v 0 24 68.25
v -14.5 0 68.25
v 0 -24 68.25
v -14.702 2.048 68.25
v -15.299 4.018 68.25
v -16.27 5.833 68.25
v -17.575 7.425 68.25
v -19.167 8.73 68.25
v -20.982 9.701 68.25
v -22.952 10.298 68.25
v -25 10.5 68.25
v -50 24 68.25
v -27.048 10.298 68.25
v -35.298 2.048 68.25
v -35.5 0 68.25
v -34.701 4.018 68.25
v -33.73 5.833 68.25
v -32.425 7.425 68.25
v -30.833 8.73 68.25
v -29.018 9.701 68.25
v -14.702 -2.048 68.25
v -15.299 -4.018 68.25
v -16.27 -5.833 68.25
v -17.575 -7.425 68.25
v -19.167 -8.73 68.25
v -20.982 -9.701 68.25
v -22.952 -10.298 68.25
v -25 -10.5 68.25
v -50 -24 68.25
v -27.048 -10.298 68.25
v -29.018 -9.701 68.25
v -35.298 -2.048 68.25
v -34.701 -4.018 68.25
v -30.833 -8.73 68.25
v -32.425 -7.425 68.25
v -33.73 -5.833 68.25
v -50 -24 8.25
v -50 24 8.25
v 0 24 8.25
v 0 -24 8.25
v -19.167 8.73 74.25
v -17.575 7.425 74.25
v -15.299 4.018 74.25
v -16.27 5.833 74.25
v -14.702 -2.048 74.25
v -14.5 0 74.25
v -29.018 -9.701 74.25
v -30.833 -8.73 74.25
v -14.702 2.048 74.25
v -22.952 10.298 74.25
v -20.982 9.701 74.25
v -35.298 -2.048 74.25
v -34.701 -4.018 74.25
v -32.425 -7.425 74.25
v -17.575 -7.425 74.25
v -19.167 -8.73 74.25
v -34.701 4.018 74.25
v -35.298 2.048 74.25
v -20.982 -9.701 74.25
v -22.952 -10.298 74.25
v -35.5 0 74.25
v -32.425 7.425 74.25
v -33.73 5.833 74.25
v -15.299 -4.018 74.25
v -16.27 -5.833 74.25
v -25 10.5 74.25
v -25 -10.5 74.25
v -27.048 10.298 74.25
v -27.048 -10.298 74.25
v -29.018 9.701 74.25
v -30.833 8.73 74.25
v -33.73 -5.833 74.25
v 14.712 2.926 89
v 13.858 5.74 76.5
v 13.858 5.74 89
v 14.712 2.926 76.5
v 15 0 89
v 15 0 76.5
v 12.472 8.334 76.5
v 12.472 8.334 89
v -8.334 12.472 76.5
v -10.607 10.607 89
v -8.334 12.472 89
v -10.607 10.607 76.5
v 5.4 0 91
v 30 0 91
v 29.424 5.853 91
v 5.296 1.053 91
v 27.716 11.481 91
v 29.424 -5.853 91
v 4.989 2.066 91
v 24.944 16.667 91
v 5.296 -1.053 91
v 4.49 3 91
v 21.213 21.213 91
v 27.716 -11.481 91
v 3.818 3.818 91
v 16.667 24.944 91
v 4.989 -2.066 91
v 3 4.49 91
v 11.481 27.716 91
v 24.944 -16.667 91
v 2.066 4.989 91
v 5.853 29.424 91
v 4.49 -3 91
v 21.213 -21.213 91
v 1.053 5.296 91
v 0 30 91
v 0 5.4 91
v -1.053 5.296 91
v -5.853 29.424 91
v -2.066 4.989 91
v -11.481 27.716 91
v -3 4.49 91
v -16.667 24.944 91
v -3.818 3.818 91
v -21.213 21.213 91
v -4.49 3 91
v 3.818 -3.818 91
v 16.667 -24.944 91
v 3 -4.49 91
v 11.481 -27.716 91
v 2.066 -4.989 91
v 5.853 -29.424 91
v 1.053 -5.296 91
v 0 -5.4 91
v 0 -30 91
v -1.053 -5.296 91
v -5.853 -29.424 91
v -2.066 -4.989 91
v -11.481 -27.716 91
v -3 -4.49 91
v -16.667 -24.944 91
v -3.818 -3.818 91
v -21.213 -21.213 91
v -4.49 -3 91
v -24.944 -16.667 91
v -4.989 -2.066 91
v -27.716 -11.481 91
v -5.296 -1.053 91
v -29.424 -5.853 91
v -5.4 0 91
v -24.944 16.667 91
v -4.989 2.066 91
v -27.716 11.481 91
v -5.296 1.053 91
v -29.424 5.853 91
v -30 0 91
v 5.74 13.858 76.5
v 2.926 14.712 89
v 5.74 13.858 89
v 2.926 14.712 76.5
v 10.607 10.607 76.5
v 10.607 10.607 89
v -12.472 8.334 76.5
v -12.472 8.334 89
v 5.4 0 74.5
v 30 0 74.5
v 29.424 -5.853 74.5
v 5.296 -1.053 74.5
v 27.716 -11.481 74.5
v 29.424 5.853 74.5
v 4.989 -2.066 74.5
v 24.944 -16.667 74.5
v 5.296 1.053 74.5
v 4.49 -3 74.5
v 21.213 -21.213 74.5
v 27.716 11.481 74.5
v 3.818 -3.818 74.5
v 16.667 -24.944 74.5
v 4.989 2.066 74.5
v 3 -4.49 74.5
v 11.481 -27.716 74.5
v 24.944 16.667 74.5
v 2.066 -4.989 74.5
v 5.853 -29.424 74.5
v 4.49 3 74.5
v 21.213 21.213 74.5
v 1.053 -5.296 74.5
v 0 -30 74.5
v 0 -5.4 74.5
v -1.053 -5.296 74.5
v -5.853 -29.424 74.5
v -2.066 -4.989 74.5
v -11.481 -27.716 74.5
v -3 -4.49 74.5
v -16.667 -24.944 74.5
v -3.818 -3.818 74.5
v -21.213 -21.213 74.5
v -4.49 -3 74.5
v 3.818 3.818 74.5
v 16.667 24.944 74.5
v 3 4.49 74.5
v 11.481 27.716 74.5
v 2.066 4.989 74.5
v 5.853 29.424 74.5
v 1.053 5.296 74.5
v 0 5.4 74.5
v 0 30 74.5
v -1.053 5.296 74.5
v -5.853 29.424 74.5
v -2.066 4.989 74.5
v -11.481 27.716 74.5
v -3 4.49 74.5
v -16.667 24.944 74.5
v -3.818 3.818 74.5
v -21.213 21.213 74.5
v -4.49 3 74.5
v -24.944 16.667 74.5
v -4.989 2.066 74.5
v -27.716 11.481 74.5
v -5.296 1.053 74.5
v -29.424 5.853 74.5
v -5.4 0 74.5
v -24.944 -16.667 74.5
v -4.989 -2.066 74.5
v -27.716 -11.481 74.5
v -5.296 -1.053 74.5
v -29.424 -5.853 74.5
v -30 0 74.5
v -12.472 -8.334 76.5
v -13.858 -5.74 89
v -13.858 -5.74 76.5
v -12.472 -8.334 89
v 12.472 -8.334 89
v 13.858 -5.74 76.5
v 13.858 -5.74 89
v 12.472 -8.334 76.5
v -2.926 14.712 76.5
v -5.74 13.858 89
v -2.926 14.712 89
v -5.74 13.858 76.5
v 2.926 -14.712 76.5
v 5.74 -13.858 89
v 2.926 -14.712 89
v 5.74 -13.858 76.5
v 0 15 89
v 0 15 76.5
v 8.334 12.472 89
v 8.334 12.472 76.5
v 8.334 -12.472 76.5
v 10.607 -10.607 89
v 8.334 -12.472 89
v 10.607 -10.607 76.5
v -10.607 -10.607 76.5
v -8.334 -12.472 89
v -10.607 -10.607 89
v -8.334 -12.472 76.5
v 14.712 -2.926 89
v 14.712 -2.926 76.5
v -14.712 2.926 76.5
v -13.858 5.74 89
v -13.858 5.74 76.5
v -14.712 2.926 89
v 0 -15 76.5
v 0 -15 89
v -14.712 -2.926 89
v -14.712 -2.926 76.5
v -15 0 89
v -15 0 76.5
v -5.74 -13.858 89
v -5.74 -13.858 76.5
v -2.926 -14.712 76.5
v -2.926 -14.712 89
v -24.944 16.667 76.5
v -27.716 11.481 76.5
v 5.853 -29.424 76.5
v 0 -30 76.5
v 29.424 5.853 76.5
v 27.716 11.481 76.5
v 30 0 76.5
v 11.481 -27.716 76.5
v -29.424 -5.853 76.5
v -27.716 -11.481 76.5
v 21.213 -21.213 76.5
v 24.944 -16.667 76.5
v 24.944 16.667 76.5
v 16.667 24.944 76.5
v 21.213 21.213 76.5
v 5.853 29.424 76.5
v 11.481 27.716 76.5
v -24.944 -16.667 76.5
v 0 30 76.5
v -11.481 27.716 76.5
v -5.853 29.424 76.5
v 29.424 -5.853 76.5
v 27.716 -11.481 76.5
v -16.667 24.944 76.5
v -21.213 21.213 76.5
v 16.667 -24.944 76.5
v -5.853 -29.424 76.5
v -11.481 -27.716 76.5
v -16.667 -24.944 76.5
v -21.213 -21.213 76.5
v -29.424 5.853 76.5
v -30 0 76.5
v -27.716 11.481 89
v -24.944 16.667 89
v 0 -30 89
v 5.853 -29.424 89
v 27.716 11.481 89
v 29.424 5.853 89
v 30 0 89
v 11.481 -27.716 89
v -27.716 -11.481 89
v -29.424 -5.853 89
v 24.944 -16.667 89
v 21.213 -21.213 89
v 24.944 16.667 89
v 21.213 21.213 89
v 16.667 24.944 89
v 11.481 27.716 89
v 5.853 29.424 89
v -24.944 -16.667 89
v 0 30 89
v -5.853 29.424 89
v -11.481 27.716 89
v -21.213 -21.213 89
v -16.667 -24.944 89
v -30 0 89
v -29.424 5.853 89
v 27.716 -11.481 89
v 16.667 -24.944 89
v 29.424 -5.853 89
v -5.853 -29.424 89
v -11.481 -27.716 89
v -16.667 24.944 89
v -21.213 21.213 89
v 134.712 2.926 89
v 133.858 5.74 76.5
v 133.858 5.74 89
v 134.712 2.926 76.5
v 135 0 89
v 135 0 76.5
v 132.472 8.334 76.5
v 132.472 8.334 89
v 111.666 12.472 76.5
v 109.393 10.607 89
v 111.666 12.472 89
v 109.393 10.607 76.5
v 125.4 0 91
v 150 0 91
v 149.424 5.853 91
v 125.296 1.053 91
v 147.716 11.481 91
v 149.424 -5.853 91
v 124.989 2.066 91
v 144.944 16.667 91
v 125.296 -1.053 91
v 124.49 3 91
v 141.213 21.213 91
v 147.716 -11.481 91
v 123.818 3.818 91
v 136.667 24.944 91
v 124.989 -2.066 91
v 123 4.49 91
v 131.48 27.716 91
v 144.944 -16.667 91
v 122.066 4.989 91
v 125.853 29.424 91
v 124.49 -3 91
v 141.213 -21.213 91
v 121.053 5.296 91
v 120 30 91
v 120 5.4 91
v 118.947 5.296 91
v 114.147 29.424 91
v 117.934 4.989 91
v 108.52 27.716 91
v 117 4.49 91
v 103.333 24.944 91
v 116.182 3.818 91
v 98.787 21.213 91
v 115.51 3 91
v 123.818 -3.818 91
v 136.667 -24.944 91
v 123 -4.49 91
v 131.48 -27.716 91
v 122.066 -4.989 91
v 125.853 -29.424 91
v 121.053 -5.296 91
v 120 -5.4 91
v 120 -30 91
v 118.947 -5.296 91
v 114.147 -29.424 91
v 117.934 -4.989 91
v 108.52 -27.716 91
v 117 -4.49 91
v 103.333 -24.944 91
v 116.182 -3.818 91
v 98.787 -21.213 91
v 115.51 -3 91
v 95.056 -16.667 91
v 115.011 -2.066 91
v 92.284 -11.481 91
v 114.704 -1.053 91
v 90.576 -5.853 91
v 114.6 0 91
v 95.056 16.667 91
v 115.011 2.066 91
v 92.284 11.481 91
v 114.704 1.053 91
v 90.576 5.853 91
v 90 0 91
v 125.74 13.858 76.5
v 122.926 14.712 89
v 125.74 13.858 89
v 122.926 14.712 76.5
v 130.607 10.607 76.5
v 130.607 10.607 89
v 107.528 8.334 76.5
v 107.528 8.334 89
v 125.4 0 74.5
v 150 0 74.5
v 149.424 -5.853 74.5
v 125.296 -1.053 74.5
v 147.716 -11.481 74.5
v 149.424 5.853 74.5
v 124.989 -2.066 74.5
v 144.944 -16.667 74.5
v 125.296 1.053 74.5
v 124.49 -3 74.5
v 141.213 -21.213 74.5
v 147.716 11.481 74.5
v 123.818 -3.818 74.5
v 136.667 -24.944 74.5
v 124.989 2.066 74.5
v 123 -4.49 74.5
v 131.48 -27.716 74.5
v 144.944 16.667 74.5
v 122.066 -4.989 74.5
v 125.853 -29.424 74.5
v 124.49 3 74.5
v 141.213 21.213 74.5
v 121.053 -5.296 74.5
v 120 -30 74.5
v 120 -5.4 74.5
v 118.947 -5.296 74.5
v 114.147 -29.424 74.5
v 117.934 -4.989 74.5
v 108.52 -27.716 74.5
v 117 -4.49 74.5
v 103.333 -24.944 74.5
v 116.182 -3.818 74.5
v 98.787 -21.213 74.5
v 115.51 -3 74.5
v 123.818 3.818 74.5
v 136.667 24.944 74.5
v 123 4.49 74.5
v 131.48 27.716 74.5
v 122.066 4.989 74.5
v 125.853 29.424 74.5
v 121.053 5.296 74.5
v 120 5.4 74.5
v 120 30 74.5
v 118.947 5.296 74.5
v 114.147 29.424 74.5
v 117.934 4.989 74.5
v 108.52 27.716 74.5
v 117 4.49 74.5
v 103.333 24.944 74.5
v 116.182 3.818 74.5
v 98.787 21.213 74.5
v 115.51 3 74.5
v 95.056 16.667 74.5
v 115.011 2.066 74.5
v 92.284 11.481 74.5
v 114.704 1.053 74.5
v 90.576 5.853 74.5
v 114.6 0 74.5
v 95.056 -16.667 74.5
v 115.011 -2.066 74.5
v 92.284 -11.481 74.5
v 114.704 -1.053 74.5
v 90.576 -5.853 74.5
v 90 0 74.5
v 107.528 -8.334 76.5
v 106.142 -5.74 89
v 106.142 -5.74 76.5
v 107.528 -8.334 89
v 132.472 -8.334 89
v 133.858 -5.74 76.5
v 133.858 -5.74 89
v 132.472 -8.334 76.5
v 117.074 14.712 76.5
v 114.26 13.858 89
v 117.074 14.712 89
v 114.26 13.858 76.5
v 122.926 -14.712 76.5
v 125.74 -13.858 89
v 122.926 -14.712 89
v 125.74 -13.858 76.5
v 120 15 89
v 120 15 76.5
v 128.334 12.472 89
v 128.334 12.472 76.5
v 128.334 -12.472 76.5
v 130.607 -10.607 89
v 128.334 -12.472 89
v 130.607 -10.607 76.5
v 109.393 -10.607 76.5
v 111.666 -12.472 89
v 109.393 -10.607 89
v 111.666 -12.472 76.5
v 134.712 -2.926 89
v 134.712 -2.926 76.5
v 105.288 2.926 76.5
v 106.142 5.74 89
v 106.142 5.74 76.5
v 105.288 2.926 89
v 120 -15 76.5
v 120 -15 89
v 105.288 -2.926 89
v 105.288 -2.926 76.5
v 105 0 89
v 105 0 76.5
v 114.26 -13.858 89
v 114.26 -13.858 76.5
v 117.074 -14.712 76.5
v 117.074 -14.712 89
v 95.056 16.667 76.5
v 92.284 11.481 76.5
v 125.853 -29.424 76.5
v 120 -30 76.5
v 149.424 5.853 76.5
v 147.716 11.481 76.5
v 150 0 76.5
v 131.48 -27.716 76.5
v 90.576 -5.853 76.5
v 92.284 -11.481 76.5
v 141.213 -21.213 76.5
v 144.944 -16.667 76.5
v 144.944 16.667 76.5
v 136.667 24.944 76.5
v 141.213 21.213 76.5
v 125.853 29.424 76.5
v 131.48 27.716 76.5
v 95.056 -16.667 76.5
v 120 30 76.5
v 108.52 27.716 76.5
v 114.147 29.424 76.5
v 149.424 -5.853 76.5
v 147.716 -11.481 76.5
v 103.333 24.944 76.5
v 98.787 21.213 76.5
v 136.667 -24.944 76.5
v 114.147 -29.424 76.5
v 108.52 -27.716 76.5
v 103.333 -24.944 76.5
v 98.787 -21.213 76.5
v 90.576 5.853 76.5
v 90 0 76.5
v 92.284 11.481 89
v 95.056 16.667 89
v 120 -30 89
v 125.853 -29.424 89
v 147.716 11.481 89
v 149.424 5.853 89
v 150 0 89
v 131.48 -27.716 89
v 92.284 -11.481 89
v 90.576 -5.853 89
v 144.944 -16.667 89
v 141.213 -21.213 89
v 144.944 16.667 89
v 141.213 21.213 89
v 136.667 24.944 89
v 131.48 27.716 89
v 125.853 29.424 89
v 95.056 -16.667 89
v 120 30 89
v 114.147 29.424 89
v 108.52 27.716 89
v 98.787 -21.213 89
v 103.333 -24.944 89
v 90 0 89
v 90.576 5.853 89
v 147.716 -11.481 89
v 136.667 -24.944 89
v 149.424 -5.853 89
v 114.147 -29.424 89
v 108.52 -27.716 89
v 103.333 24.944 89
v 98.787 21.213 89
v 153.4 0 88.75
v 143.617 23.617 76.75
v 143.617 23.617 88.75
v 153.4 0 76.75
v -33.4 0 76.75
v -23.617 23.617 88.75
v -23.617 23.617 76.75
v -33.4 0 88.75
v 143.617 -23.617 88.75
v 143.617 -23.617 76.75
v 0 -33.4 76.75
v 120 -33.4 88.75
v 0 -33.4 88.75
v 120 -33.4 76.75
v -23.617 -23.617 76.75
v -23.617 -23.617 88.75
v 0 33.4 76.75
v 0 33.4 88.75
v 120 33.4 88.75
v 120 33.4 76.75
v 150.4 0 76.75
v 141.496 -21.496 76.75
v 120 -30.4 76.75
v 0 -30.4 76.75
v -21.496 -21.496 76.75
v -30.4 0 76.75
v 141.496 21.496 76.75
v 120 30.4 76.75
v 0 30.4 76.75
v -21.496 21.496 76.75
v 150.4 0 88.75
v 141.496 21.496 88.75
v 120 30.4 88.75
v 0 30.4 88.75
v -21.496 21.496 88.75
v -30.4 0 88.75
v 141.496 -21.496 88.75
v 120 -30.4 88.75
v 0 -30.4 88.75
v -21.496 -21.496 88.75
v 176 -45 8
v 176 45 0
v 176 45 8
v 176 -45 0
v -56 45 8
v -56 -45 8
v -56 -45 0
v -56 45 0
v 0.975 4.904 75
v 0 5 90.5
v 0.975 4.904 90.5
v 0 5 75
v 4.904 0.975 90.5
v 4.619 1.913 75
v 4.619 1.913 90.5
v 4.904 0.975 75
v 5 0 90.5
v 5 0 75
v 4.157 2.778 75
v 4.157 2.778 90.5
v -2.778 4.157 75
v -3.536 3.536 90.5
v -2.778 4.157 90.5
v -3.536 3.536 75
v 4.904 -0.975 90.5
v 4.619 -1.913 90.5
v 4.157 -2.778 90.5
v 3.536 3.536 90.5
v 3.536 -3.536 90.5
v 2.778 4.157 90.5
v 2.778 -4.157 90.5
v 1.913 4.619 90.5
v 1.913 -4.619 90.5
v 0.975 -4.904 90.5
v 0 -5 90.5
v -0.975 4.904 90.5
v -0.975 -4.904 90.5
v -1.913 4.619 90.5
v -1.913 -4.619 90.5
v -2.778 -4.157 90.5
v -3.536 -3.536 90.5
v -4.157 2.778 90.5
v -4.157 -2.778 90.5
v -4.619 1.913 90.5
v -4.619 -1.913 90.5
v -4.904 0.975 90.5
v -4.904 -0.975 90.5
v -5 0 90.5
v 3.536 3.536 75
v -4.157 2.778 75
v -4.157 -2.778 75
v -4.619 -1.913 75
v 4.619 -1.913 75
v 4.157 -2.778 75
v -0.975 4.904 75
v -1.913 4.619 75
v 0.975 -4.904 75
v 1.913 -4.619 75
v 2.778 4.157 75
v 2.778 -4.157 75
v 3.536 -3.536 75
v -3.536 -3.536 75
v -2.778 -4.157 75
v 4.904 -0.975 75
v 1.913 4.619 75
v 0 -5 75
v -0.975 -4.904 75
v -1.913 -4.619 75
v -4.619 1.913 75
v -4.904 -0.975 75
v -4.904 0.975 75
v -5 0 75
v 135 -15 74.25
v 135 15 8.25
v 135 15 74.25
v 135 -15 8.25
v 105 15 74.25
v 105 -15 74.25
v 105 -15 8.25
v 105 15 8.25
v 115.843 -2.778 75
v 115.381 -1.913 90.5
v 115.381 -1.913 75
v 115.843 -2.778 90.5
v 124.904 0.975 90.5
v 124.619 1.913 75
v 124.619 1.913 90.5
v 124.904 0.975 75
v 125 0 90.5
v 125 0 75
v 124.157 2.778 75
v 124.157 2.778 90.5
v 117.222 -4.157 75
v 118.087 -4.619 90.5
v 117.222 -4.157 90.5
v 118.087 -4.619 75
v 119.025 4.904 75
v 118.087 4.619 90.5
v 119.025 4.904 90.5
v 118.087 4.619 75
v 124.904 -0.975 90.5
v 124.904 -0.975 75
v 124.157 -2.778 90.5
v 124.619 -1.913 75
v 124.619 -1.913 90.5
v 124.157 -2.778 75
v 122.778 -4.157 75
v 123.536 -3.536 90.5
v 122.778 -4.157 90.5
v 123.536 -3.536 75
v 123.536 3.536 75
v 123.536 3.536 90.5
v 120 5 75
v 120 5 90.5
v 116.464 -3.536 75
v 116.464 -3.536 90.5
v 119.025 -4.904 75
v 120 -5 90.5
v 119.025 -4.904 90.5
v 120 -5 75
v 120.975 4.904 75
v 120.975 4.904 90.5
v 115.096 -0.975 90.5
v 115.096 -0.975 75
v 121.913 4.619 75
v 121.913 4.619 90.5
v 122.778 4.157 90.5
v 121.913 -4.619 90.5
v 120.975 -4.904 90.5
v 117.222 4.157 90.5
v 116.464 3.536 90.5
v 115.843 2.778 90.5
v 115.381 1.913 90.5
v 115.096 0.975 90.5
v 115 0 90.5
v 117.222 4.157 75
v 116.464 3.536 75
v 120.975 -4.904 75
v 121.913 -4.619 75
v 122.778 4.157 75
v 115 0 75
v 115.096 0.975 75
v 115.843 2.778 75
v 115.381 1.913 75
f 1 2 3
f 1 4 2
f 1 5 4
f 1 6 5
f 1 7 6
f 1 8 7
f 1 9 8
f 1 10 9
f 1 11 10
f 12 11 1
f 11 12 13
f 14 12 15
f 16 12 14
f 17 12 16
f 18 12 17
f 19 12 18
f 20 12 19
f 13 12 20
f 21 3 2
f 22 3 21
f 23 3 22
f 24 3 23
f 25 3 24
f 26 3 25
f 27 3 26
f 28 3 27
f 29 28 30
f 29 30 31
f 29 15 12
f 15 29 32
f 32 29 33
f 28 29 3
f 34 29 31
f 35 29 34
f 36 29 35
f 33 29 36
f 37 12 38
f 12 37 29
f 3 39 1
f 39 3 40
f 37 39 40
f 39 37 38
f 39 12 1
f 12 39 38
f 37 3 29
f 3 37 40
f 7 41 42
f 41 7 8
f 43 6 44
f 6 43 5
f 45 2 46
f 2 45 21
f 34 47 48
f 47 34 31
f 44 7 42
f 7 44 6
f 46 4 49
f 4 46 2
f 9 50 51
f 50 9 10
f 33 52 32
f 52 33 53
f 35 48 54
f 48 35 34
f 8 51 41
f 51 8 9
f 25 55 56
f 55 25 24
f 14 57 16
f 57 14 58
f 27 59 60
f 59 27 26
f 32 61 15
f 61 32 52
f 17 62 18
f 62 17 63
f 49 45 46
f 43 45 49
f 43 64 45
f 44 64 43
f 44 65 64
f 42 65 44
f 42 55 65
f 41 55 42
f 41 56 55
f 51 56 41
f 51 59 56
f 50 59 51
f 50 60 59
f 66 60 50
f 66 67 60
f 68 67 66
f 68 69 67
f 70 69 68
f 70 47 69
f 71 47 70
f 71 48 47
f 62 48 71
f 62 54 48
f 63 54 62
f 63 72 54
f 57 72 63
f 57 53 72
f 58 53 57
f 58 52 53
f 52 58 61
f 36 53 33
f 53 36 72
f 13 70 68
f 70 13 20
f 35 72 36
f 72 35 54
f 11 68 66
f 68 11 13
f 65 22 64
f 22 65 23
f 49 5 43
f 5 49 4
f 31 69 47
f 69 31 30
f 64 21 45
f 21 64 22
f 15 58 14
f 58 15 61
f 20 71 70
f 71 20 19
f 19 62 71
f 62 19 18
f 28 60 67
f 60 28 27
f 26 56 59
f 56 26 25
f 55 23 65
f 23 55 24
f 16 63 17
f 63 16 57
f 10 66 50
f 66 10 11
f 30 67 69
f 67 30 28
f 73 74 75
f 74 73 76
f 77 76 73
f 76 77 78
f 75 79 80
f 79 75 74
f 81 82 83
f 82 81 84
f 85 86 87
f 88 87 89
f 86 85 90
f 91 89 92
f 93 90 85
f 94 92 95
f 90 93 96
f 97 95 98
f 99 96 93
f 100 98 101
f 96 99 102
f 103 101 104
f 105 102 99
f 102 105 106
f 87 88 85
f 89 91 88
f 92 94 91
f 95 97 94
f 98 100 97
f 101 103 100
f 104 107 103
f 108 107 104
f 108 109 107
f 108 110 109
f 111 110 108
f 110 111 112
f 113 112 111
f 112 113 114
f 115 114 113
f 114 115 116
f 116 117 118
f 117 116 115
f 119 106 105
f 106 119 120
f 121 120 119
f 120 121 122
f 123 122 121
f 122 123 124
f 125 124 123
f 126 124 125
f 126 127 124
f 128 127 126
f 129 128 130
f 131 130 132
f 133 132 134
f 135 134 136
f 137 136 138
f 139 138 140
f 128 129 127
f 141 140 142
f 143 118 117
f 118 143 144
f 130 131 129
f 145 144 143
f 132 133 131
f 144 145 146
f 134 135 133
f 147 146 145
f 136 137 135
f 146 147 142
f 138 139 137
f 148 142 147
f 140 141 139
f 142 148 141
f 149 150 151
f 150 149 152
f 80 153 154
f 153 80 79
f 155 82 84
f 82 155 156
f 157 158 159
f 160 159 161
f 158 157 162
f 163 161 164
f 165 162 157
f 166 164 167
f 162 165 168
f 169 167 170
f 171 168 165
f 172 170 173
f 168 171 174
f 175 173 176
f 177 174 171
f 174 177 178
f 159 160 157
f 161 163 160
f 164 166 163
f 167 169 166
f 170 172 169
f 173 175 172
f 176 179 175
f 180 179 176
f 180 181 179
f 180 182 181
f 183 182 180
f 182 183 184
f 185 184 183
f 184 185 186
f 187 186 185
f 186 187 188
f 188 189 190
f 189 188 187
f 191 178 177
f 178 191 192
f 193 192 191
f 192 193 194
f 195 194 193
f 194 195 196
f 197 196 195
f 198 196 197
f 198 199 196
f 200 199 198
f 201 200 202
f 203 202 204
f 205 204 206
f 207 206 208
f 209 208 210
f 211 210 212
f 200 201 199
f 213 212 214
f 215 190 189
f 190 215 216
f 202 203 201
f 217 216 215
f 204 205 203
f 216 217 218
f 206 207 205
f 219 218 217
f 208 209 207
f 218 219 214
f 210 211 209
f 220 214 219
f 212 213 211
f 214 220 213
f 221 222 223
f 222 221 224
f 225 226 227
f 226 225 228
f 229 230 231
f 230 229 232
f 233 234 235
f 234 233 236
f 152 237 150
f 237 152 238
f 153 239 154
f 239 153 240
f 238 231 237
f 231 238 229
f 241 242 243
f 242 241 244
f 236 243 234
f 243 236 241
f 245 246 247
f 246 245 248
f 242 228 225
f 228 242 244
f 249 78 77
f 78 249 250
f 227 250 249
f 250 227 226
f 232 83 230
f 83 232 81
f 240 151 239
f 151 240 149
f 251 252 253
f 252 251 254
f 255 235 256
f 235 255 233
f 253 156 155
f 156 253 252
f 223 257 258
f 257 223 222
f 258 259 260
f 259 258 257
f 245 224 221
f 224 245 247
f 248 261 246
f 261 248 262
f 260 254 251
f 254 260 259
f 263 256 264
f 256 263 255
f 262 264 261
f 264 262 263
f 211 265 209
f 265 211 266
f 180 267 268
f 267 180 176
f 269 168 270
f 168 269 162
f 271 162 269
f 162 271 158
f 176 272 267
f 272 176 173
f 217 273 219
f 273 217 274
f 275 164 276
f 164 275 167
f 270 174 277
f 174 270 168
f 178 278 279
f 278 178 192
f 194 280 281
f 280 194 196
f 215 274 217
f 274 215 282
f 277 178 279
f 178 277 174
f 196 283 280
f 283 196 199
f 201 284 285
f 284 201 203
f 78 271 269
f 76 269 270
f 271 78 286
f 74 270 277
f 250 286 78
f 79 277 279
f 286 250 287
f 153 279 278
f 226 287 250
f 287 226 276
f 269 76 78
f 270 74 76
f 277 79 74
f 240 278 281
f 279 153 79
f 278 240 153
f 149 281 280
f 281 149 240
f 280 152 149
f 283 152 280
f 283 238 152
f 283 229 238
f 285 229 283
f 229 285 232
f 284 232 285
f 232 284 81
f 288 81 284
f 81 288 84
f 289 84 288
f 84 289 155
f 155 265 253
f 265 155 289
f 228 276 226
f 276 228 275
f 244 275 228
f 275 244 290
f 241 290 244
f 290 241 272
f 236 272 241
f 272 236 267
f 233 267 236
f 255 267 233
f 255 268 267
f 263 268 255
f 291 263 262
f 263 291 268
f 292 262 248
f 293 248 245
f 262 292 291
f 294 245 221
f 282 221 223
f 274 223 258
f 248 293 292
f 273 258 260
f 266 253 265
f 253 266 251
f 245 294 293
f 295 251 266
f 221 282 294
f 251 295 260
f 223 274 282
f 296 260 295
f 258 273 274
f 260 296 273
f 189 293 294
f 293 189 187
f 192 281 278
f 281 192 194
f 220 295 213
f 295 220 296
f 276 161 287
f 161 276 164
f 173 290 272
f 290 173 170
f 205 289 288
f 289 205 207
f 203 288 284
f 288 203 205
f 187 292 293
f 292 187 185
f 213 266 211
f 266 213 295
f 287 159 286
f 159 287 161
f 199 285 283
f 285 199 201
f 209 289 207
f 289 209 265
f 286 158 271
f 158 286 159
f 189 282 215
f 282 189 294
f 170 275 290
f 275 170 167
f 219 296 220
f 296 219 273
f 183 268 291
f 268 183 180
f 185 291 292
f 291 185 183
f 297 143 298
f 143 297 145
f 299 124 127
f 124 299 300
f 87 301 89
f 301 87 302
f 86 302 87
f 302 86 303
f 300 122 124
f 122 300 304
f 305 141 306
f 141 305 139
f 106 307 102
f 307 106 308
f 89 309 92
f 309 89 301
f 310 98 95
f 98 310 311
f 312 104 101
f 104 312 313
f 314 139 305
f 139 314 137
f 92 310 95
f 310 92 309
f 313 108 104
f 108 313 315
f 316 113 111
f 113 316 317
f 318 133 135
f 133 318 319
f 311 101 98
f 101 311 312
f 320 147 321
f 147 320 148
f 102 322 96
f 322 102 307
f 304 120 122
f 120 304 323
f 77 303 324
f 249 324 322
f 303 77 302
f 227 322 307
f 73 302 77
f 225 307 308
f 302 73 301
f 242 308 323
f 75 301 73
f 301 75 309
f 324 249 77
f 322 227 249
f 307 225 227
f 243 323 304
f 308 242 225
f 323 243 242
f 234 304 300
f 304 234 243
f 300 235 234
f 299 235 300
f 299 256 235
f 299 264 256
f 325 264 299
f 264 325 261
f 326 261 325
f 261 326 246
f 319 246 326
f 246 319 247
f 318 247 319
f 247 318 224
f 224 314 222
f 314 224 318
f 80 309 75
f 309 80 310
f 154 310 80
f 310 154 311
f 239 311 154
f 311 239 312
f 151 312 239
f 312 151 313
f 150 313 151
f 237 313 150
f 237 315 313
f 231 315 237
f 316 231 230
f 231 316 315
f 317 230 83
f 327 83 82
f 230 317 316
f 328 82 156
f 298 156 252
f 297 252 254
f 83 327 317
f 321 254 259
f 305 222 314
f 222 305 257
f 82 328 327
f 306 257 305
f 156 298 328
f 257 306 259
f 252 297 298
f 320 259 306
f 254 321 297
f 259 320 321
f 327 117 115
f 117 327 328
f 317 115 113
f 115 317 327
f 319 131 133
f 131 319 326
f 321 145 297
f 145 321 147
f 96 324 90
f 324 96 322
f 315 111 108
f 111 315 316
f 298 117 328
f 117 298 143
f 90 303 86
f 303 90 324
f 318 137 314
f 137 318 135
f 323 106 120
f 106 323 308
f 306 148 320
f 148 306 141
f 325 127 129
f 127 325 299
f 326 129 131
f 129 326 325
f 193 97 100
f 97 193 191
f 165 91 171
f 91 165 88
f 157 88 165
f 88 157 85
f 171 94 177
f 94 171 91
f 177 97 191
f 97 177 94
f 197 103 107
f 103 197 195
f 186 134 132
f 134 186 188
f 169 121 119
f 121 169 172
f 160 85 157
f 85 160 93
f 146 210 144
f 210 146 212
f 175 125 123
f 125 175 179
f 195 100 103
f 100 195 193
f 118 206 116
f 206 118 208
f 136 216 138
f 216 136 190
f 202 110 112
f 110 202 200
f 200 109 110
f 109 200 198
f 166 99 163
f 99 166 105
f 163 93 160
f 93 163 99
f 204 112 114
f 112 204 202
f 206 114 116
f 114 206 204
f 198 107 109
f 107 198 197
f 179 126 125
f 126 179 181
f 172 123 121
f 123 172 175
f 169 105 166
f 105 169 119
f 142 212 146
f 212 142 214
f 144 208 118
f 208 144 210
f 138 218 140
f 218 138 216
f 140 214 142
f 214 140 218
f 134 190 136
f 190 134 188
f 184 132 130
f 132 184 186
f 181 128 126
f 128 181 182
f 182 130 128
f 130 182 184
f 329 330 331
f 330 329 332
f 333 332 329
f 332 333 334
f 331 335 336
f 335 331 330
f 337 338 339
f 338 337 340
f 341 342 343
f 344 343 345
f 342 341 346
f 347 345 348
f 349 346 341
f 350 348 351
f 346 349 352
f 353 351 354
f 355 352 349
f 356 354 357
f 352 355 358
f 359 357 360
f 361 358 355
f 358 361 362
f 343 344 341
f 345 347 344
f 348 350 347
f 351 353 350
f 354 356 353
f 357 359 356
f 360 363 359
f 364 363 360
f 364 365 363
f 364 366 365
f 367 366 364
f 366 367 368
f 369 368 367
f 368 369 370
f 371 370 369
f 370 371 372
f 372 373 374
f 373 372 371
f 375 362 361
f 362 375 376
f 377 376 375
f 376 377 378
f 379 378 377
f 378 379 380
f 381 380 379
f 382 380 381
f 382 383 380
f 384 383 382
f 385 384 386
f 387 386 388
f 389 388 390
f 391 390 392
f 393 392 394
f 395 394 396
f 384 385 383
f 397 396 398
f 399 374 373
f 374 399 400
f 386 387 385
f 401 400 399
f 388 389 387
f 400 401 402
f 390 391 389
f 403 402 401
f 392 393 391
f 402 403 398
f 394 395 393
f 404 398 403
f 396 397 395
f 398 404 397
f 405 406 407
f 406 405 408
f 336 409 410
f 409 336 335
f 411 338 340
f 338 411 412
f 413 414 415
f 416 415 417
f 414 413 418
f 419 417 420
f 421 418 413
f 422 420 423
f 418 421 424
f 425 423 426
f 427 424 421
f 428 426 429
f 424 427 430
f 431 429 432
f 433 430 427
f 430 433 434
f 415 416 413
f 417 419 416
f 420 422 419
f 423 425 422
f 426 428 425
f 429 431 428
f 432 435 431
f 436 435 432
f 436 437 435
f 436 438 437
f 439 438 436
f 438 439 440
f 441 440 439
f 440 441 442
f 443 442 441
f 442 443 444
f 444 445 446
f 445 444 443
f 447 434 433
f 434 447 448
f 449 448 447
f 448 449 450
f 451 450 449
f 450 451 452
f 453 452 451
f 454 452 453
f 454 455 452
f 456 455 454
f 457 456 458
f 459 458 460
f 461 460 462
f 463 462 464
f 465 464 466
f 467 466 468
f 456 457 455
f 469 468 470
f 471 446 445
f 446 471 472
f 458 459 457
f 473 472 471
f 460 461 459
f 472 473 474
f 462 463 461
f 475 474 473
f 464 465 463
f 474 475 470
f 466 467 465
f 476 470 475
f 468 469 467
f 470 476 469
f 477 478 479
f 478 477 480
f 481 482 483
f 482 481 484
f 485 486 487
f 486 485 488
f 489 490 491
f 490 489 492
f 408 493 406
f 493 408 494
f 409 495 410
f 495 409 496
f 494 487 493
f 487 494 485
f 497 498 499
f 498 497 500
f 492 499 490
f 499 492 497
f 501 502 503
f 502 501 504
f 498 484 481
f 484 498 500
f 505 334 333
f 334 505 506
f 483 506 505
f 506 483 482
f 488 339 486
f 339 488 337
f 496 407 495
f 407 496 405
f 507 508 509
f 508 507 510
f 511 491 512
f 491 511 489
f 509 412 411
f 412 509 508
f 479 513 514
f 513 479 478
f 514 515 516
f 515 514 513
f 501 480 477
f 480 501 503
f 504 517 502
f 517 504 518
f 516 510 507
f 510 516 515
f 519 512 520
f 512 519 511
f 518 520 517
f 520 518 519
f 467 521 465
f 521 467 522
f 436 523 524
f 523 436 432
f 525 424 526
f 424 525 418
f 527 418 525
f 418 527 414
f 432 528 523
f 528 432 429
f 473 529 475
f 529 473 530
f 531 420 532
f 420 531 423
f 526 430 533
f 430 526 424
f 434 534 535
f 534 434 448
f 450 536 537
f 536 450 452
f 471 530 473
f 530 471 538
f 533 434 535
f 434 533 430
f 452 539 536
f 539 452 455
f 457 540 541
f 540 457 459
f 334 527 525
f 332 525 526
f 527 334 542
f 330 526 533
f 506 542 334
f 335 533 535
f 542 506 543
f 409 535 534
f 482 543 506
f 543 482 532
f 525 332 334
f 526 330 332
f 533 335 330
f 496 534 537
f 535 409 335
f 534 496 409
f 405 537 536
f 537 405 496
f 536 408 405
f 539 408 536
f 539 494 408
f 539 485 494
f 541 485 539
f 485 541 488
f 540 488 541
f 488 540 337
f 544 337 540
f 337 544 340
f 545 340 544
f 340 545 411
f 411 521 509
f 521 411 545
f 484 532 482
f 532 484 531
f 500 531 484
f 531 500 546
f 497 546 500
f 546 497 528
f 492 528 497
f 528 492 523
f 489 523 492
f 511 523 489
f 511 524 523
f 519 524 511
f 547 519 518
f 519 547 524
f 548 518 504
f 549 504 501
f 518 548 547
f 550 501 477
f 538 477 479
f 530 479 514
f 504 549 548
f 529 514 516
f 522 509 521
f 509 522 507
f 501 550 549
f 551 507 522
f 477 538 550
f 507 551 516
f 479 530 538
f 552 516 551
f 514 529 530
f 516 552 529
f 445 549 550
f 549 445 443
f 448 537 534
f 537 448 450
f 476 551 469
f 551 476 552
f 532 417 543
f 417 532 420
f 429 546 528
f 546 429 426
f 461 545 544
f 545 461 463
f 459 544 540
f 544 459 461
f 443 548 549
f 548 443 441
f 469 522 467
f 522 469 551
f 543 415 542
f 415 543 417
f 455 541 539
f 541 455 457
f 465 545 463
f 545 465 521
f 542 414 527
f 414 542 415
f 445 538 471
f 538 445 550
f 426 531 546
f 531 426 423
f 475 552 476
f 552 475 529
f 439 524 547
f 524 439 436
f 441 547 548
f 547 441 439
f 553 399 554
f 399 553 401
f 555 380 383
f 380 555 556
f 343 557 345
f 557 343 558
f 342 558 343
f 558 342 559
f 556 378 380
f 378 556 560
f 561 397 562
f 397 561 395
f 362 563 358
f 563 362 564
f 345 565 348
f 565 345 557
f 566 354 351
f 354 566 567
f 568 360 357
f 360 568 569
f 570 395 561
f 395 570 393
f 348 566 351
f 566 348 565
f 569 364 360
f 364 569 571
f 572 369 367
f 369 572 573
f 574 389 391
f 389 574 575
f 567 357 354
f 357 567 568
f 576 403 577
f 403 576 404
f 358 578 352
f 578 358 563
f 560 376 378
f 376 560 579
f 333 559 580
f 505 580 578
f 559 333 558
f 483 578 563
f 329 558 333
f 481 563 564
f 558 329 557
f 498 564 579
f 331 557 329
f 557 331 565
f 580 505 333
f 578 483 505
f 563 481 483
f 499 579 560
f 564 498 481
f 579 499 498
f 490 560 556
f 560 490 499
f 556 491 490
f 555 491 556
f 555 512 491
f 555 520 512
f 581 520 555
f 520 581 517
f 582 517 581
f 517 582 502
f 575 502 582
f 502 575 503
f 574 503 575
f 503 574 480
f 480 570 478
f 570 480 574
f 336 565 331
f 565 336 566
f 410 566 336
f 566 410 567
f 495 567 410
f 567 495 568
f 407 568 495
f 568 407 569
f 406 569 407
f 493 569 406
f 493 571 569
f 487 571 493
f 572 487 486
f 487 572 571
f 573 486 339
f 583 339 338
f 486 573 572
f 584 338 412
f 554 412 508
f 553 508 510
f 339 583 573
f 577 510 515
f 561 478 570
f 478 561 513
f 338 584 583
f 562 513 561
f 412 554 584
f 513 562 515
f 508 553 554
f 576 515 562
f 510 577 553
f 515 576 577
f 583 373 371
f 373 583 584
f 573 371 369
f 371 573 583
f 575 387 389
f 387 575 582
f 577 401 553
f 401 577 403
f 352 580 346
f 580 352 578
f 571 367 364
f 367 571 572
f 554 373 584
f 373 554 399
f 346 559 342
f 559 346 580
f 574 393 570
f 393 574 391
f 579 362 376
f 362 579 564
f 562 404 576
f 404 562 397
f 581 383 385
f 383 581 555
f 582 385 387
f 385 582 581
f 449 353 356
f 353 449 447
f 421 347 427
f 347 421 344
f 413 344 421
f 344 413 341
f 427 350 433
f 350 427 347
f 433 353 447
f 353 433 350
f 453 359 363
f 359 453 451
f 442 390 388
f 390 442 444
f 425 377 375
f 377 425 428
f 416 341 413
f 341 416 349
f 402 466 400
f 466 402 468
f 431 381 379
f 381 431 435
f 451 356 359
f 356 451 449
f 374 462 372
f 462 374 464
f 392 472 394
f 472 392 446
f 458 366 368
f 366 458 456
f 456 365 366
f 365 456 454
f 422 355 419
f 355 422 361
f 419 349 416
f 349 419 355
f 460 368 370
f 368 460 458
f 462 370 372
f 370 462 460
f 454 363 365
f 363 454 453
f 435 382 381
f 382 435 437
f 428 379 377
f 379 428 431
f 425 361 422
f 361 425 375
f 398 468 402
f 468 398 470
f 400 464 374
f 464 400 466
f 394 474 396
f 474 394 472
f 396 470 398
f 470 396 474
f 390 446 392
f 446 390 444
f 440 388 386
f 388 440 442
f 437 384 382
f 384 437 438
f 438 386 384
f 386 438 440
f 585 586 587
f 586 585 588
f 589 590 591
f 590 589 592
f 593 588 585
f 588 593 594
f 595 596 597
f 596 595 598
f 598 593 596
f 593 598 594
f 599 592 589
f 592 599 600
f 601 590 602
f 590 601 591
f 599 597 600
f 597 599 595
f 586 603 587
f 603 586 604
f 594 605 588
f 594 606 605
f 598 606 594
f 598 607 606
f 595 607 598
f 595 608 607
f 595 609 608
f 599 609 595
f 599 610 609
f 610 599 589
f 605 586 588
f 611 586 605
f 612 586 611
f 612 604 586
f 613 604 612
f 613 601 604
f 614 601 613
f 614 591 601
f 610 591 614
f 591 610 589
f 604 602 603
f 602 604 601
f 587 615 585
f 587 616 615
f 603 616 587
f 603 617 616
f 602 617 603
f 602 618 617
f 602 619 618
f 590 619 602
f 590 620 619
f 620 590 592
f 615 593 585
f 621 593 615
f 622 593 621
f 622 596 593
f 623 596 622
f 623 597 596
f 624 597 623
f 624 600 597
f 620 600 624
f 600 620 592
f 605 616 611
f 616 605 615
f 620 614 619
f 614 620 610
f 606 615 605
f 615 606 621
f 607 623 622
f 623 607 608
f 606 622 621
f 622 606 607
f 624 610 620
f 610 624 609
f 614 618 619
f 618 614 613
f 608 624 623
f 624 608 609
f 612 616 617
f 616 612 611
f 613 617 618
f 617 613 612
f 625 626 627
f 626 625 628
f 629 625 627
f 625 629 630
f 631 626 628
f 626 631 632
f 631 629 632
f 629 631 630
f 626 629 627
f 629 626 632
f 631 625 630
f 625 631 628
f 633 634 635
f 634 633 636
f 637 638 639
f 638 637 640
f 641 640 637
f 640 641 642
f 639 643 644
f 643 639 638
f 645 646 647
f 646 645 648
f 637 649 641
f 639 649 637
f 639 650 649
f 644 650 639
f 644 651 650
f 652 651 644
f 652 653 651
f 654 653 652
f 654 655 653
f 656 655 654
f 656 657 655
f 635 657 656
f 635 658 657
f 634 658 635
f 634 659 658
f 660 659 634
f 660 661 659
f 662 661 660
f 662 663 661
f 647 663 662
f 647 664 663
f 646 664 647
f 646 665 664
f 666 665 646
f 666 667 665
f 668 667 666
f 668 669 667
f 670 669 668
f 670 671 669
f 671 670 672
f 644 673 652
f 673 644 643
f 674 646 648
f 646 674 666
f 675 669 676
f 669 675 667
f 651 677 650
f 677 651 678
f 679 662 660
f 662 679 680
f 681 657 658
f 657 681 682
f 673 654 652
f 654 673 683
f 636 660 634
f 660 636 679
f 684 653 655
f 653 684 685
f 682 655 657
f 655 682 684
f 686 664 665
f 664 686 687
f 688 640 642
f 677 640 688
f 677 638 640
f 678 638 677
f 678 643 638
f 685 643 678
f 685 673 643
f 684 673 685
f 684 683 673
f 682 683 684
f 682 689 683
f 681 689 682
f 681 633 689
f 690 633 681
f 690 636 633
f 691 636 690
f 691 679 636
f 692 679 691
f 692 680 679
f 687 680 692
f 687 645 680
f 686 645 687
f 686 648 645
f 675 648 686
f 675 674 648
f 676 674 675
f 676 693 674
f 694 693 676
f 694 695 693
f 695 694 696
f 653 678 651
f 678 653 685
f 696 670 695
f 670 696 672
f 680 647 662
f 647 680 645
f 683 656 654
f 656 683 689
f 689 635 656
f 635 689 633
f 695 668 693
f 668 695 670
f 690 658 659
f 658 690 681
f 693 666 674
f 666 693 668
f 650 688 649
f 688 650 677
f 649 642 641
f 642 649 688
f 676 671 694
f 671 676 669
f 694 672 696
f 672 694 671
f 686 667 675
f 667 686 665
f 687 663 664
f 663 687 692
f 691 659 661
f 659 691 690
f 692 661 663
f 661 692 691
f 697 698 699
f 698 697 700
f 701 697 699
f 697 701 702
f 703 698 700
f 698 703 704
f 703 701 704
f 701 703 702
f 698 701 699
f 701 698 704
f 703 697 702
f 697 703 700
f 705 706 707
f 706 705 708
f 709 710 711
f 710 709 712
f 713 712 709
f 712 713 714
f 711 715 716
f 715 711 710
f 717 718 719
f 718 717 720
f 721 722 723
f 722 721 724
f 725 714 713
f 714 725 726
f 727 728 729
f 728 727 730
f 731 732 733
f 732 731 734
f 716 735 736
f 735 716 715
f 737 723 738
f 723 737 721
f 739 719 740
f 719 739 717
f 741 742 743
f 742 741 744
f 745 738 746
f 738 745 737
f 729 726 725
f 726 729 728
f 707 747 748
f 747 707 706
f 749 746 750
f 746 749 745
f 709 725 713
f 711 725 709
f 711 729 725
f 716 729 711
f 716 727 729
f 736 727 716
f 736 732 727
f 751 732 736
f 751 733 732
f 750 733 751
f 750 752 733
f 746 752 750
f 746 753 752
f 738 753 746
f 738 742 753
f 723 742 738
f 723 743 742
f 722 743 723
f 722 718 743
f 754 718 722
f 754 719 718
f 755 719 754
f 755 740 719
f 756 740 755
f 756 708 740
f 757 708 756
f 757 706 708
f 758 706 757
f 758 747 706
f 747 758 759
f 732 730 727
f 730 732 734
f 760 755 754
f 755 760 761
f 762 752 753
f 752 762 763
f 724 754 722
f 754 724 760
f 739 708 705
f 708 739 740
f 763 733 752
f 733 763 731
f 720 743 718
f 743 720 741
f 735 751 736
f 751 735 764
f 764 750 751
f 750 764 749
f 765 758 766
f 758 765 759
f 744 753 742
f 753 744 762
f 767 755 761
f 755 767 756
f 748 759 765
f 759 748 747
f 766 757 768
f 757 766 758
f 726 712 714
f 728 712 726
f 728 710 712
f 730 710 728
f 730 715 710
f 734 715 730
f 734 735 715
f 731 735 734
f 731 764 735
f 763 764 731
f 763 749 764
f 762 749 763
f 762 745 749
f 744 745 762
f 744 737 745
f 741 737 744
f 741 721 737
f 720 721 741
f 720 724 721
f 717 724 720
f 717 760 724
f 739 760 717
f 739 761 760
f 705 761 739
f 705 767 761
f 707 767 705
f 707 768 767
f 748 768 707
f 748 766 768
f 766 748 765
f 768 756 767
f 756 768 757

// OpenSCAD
$fn = 32;

// ------------------------------------------------------------------------
// Motor belt drive: span 120 mm, pulleys d60, belt 12 mm wide
// Every part is its own module, assembly() places every instance.
// ------------------------------------------------------------------------

// --- part 1 ---
module base_plate() {
  difference() {
    translate([-116, -45, 0]) cube([232, 90, 8]);
  }
}

// --- part 2 ---
module motor() {
  union() {
    translate([-30, -24, 0]) cube([60, 48, 50]);
    translate([33, 0, 25]) rotate([0, 90, 0]) cylinder(h = 6, d = 21, center = true);
  }
}

// --- part 3 ---
module drive_shaft() {
  translate([0, 0, -7.75]) cylinder(h = 15.5, d = 10);
}

// --- part 4 ---
module pulley_drive() {
  difference() {
    union() {
      cylinder(h = 16.5, d = 30);
      cylinder(h = 2, d = 60);
      translate([0, 0, 14.5]) cylinder(h = 2, d = 60);
    }
    translate([0, 0, -1]) cylinder(h = 18.5, d = 10.8);
  }
}

// --- part 5 ---
module idler_post() {
  translate([-15, -15, 0]) cube([30, 30, 66]);
}

// --- part 6 ---
module driven_shaft() {
  translate([0, 0, -7.75]) cylinder(h = 15.5, d = 10);
}

// --- part 7 ---
module pulley_driven() {
  difference() {
    union() {
      cylinder(h = 16.5, d = 30);
      cylinder(h = 2, d = 60);
      translate([0, 0, 14.5]) cylinder(h = 2, d = 60);
    }
    translate([0, 0, -1]) cylinder(h = 18.5, d = 10.8);
  }
}

// --- part 8 ---
module drive_belt() {
  difference() {
    linear_extrude(height = 12) polygon(points = concat([for (a = [90 : 45 : 270]) [33.4 * cos(a), 33.4 * sin(a)]], [for (a = [270 : 45 : 450]) [120 + 33.4 * cos(a), 33.4 * sin(a)]]));
    translate([0, 0, -1]) linear_extrude(height = 14) polygon(points = concat([for (a = [90 : 45 : 270]) [30.4 * cos(a), 30.4 * sin(a)]], [for (a = [270 : 45 : 450]) [120 + 30.4 * cos(a), 30.4 * sin(a)]]));
  }
}

// --- assembly ---
module assembly() {
  color([0.80, 0.24, 0.20]) translate([60, 0, 0]) rotate([0, 0, 0]) base_plate();
  color([0.20, 0.45, 0.75]) translate([0, 0, 38.25]) rotate([0, 270, 0]) motor();
  color([0.25, 0.62, 0.32]) translate([0, 0, 82.75]) rotate([0, 0, 0]) drive_shaft();
  color([0.92, 0.70, 0.18]) translate([0, 0, 74.5]) rotate([0, 0, 0]) pulley_drive();
  color([0.58, 0.35, 0.70]) translate([120, 0, 8.25]) rotate([0, 0, 0]) idler_post();
  color([0.16, 0.66, 0.66]) translate([120, 0, 82.75]) rotate([0, 0, 0]) driven_shaft();
  color([0.85, 0.48, 0.18]) translate([120, 0, 74.5]) rotate([0, 0, 0]) pulley_driven();
  color([0.55, 0.60, 0.65]) translate([0, 0, 76.75]) rotate([0, 0, 0]) drive_belt();
}

assembly();
